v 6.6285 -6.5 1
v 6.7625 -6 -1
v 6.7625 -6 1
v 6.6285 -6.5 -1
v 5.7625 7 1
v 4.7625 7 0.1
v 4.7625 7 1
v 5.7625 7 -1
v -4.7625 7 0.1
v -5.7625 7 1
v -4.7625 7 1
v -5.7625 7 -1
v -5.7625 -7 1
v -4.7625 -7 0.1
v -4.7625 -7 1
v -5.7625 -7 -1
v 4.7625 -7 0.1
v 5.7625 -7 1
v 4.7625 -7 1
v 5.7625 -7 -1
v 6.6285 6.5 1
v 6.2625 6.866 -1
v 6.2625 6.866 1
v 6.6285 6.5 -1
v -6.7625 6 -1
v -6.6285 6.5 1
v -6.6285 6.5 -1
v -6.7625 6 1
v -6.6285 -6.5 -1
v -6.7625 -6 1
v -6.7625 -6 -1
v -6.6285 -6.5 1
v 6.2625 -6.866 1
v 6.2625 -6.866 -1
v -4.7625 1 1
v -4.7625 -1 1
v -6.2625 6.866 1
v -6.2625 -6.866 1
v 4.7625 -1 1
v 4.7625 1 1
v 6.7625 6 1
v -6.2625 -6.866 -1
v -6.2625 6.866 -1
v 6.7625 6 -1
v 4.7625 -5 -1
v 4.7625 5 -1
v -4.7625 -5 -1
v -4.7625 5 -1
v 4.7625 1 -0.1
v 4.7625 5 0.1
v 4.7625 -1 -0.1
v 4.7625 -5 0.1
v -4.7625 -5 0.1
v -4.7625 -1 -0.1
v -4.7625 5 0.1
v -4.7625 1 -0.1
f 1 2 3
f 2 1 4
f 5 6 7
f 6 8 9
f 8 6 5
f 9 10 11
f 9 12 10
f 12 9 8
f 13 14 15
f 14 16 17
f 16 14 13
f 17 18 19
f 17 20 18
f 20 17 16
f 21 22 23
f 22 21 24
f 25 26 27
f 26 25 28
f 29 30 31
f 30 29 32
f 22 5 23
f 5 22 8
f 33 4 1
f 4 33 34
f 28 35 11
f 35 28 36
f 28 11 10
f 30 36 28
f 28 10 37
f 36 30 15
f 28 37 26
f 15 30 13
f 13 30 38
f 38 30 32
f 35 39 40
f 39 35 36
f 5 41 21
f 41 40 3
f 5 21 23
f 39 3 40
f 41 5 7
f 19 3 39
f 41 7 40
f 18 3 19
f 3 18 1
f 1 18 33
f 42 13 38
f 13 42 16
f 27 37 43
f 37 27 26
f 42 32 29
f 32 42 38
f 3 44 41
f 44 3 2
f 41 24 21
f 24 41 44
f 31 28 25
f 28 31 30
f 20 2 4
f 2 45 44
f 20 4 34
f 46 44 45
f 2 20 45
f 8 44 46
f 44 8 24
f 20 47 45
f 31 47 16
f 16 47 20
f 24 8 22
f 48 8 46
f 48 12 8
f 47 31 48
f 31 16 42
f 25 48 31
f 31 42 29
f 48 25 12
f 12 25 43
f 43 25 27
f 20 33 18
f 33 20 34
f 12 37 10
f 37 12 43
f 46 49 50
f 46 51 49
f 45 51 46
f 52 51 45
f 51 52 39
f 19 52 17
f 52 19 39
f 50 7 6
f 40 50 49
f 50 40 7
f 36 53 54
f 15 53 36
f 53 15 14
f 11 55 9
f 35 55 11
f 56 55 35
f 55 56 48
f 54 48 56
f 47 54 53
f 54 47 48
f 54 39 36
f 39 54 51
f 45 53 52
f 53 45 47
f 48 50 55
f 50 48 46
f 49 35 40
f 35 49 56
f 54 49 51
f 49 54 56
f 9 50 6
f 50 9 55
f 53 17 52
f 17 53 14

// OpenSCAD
//Parametric tri-glide webbing buckle

//INCH = 25.4;

//Width of webbing in mm
width = 9.525;

//Thickness of webbing
thickness = 1; //[0.5:0.1:2.0]

//Base thickness of buckle structure
BULK = 2;

module buckle(webbing_width, webbing_thickness=2) {
    width = webbing_width + 2*BULK;
    length = 4*webbing_thickness + 3 * BULK;
    difference() {
        minkowski() {
            cube([width-BULK, length-BULK, BULK/2], center=true);
            cylinder(BULK/2, BULK/2, BULK/2, center=true, $fn=12);
        }
        translate([0, -1.5*BULK, 0])
            cube([webbing_width, 2*webbing_thickness, 2*BULK], center=true);
        translate([0, 1.5*BULK, 0])
            cube([webbing_width, 2*webbing_thickness, 2*BULK], center=true);
        translate([0, 0, -BULK/4-0.1]) {
            cube([webbing_width, 2*BULK, BULK/2], center=true);
        }
        translate([0, 2*webbing_thickness+BULK, BULK/4+0.1]) {
            cube([webbing_width, 2*BULK, BULK/2], center=true);
        }
        translate([0, -2*webbing_thickness-BULK, BULK/4+0.1]) {
            cube([webbing_width, 2*BULK, BULK/2], center=true);
        }
    }
}

buckle(width, 2*thickness);
